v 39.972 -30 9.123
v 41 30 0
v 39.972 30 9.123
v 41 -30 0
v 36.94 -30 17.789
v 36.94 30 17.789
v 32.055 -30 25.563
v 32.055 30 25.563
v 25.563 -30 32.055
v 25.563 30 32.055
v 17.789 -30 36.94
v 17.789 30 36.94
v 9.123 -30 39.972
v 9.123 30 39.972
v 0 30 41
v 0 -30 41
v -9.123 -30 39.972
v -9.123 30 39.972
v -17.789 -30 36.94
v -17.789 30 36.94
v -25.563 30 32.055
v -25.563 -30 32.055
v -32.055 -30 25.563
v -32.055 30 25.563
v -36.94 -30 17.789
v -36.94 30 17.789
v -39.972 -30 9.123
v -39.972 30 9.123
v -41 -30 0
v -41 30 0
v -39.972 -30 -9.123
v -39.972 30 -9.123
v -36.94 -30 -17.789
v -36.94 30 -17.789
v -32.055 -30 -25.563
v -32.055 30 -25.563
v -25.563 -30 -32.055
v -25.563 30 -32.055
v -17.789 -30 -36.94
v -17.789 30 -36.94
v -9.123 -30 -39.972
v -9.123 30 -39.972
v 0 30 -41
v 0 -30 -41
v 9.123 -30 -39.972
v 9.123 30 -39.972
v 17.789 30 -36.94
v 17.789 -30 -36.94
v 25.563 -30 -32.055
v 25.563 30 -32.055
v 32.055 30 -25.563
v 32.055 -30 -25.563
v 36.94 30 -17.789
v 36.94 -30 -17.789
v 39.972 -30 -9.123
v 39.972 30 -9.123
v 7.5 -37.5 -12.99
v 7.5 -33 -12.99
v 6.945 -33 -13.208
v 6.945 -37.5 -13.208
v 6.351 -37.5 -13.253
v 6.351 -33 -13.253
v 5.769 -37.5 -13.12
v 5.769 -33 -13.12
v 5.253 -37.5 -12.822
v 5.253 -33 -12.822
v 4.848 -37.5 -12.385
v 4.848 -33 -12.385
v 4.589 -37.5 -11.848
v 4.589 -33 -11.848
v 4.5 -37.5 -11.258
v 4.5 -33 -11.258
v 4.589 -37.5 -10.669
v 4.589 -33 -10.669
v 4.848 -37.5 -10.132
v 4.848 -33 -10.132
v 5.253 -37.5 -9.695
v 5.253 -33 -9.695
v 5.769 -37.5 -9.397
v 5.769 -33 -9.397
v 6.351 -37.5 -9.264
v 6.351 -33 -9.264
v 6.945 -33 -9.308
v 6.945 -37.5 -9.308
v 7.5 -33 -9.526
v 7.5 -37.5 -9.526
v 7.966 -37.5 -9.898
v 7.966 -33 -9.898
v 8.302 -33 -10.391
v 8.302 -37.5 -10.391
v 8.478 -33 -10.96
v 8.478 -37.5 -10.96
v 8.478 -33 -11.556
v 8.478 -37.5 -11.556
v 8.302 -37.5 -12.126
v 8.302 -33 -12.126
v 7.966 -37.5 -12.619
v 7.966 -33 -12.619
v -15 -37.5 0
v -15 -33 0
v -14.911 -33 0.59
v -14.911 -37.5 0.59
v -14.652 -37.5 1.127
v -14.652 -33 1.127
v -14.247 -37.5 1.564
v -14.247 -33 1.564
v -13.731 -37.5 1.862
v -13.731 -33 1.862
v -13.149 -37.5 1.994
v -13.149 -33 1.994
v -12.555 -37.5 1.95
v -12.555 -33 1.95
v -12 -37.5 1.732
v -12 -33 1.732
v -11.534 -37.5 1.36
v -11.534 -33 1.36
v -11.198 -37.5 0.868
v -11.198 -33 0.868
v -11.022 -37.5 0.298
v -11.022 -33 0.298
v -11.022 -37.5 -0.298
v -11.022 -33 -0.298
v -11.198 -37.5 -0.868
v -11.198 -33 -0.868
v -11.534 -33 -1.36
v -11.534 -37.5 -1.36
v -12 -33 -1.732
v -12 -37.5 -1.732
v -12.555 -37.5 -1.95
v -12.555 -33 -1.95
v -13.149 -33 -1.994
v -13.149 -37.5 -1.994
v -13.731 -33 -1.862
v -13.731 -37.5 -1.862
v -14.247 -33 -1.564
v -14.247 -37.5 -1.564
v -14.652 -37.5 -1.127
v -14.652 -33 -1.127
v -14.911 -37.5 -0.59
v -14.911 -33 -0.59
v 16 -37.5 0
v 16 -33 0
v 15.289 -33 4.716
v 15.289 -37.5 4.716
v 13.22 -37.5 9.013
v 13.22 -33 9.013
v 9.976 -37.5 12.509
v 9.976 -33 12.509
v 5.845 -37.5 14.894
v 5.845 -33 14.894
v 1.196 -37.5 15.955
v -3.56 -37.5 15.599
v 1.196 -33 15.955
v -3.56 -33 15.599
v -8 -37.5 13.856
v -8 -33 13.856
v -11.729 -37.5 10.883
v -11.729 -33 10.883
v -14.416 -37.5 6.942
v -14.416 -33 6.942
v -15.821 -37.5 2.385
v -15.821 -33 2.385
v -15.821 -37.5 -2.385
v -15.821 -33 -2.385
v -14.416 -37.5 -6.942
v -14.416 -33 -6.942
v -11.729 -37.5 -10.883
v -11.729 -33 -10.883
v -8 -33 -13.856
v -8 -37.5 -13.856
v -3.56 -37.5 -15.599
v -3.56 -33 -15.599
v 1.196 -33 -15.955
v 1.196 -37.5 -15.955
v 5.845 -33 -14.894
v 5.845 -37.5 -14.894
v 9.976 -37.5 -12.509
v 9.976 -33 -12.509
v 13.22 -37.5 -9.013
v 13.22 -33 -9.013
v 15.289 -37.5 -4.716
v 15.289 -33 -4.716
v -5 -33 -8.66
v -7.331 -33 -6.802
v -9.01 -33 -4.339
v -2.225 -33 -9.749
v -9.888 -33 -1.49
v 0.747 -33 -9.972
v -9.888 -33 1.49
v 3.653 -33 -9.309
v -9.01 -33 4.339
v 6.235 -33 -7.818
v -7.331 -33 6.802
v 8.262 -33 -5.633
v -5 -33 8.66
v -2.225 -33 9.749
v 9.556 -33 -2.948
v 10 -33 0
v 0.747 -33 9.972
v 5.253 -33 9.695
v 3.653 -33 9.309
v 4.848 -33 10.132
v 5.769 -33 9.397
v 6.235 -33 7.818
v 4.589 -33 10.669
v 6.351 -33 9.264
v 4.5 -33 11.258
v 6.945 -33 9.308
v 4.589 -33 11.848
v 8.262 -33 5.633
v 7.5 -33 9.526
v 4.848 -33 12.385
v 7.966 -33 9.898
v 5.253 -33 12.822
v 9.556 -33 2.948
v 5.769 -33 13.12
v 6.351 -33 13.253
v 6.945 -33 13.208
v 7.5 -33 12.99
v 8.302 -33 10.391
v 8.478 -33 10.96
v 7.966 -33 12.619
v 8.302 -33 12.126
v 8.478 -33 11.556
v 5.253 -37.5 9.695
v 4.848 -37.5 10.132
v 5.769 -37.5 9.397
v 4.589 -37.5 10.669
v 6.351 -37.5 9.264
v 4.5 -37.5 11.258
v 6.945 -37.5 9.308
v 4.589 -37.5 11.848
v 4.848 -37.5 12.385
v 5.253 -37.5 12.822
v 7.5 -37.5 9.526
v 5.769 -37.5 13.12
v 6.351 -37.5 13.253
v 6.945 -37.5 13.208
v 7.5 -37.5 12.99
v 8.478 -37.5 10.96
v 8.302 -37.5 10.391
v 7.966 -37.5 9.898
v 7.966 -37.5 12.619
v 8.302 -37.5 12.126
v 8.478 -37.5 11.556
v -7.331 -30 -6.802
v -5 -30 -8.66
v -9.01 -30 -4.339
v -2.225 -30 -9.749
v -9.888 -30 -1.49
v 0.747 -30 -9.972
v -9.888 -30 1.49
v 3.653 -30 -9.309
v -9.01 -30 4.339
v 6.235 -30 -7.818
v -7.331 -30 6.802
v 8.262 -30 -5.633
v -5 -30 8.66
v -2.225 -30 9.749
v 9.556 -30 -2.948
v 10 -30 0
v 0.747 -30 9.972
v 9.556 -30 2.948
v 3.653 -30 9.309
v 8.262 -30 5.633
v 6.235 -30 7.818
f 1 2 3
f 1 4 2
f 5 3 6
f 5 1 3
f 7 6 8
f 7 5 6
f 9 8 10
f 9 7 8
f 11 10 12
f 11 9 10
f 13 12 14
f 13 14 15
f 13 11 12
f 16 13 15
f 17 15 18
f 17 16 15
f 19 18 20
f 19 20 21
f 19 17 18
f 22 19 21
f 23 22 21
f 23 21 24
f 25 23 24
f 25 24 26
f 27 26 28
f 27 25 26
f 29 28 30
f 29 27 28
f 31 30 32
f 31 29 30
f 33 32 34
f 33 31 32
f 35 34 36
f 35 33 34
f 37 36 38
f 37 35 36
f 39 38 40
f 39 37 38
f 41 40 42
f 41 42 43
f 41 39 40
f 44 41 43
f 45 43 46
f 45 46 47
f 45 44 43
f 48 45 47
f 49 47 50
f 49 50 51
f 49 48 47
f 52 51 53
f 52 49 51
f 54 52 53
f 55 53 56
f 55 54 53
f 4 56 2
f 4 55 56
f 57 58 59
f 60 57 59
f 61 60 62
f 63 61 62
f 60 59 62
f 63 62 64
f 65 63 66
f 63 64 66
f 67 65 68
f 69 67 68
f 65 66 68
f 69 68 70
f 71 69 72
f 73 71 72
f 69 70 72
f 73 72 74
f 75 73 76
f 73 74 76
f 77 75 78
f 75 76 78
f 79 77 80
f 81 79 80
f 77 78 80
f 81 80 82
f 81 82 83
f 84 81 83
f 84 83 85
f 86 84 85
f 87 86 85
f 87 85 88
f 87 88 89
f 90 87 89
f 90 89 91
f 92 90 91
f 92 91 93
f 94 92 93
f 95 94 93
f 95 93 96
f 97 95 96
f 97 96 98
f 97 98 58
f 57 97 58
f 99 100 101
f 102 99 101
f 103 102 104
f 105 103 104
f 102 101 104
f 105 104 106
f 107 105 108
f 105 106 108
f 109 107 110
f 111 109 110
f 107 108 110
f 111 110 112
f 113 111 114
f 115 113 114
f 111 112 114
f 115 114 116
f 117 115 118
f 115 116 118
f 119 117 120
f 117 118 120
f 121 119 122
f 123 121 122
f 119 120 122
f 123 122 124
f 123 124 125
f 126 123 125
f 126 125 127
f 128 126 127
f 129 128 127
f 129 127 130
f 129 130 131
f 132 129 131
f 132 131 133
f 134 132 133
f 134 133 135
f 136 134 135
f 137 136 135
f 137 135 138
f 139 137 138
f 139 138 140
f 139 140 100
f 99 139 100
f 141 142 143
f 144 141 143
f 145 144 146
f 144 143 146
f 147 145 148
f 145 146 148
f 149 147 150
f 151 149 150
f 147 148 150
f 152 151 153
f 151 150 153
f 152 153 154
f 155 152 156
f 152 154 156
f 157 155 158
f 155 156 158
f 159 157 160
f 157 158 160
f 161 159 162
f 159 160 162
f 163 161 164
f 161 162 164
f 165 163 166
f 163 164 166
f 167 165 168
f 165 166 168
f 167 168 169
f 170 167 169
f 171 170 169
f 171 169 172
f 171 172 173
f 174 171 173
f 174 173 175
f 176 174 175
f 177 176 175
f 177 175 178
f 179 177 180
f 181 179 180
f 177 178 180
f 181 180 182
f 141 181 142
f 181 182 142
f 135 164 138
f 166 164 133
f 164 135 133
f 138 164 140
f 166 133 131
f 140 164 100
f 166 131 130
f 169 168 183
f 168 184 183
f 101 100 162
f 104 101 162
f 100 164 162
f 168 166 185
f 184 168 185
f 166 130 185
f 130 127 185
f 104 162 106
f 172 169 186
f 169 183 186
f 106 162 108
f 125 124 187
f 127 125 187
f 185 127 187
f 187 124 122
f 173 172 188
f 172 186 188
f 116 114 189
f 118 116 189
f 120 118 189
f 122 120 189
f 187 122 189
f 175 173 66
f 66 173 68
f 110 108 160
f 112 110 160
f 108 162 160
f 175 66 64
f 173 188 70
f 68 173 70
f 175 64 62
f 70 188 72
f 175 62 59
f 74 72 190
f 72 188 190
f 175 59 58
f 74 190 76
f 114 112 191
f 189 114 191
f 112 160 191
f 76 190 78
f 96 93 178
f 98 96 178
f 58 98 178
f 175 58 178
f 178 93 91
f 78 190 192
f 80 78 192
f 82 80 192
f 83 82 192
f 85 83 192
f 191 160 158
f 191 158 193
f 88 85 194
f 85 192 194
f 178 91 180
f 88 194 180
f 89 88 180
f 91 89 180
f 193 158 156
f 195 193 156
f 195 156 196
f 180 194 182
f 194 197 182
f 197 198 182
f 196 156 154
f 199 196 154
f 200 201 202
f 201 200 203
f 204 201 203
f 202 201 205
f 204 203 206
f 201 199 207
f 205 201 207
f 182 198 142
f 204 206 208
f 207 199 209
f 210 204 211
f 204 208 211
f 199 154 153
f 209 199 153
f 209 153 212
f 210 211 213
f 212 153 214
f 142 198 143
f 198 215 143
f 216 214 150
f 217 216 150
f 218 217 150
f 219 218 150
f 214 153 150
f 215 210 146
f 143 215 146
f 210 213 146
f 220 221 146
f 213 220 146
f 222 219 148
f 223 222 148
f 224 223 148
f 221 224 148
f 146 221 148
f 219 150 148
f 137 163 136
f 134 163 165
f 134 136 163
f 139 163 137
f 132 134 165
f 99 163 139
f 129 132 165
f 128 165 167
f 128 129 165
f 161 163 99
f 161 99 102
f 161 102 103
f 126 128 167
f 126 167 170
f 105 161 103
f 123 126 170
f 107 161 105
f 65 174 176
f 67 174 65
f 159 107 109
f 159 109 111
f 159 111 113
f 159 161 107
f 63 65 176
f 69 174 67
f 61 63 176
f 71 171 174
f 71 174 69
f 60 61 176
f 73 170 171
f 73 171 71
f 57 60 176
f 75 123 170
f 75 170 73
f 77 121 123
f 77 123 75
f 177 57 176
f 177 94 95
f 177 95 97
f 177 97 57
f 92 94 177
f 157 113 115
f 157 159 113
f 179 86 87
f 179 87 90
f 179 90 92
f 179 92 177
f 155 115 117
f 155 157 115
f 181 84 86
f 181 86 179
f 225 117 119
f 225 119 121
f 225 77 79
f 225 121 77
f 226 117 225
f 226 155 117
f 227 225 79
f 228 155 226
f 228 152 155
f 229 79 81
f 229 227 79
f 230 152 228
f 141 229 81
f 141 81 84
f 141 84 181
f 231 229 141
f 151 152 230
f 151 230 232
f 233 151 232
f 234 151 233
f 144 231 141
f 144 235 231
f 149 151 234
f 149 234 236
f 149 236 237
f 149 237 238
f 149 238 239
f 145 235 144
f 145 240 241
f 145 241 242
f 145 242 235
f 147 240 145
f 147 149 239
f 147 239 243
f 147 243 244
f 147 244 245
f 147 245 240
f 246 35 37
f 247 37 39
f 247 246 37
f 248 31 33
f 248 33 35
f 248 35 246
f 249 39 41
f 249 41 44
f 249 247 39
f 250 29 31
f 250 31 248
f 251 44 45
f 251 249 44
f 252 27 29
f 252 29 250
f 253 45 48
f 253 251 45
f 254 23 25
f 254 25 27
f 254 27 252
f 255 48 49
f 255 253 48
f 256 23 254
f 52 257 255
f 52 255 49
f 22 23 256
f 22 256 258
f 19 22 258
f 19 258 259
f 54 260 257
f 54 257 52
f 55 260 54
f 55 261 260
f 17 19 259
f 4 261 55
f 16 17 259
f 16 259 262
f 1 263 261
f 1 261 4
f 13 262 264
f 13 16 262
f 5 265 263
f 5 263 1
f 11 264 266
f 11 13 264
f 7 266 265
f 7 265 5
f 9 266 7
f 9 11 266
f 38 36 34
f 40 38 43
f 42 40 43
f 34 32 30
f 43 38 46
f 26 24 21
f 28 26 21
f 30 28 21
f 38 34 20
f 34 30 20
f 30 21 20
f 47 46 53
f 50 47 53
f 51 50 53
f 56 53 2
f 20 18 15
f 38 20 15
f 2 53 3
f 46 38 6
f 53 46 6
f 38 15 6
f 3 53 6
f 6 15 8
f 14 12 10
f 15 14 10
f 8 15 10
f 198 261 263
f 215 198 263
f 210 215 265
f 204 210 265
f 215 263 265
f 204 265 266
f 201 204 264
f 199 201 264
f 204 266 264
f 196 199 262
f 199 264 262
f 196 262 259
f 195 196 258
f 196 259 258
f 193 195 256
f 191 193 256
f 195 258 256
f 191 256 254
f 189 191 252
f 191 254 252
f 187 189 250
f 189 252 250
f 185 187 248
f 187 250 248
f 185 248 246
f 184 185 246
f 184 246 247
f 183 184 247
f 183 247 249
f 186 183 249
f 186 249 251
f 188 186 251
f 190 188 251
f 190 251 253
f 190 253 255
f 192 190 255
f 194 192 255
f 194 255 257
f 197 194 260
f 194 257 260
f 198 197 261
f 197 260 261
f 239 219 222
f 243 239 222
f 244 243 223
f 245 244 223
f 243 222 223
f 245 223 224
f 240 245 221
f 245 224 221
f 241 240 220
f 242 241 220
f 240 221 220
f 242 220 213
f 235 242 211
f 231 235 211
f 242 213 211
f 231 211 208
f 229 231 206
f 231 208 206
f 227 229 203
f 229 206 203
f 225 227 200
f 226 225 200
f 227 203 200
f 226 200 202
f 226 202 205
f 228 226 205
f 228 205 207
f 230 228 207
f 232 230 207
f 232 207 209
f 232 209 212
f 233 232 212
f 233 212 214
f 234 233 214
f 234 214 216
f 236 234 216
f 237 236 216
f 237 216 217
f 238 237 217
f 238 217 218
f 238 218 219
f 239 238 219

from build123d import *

# Parameters (mm, degrees)
F0_R            = 41
F1_DEPTH        = 30
F1_DEPTH_BACK   = 30
F2_R            = 10
F3_DEPTH        = 3
F4_R            = 16
F5_DEPTH        = 4.5
F7_D            = 4
F7_DEPTH        = 5
F7_TIP          = 1.2017212381
F7_COPIES_COUNT = 3


# Not quite as in the source:
# - a pattern or mirror of a feature is missing from the dataset's text; its kind, count and spacing are read off the source's solid


with BuildPart() as f1:
    # F0 (on Front) → F1 (new body, two sides)
    with BuildSketch(Plane.XZ) as f1_sk:
        Circle(F0_R)
    extrude(amount=F1_DEPTH)
    extrude(f1_sk.sketch, amount=-F1_DEPTH_BACK)

    # F2 (on face) → F3 (join)
    with BuildSketch(Plane.XZ.offset(30)):
        Circle(F2_R)
    extrude(amount=F3_DEPTH)

    # F4 (on face) → F5 (join)
    with BuildSketch(Plane.XZ.offset(33)):
        Circle(F4_R)
    extrude(amount=F5_DEPTH)

    # F7
    with Locations(Plane.XZ.offset(37.5)):
        with Locations((-13, 0)):
            f7 = Hole(F7_D / 2, depth=F7_DEPTH)
            with Locations((0, 0, -(F7_DEPTH + F7_TIP / 2))):  # 118° drill point
                Cone(0, F7_D / 2, F7_TIP, mode=Mode.SUBTRACT)

    # F7_copies: F7 ×3 about axis
    f7_copies_axis = Axis((0, 0, 0), (0, 1, 0))
    for i in range(1, F7_COPIES_COUNT):
        add(f7.rotate(f7_copies_axis, i * 360 / F7_COPIES_COUNT), mode=Mode.SUBTRACT)


solid = f1.part
